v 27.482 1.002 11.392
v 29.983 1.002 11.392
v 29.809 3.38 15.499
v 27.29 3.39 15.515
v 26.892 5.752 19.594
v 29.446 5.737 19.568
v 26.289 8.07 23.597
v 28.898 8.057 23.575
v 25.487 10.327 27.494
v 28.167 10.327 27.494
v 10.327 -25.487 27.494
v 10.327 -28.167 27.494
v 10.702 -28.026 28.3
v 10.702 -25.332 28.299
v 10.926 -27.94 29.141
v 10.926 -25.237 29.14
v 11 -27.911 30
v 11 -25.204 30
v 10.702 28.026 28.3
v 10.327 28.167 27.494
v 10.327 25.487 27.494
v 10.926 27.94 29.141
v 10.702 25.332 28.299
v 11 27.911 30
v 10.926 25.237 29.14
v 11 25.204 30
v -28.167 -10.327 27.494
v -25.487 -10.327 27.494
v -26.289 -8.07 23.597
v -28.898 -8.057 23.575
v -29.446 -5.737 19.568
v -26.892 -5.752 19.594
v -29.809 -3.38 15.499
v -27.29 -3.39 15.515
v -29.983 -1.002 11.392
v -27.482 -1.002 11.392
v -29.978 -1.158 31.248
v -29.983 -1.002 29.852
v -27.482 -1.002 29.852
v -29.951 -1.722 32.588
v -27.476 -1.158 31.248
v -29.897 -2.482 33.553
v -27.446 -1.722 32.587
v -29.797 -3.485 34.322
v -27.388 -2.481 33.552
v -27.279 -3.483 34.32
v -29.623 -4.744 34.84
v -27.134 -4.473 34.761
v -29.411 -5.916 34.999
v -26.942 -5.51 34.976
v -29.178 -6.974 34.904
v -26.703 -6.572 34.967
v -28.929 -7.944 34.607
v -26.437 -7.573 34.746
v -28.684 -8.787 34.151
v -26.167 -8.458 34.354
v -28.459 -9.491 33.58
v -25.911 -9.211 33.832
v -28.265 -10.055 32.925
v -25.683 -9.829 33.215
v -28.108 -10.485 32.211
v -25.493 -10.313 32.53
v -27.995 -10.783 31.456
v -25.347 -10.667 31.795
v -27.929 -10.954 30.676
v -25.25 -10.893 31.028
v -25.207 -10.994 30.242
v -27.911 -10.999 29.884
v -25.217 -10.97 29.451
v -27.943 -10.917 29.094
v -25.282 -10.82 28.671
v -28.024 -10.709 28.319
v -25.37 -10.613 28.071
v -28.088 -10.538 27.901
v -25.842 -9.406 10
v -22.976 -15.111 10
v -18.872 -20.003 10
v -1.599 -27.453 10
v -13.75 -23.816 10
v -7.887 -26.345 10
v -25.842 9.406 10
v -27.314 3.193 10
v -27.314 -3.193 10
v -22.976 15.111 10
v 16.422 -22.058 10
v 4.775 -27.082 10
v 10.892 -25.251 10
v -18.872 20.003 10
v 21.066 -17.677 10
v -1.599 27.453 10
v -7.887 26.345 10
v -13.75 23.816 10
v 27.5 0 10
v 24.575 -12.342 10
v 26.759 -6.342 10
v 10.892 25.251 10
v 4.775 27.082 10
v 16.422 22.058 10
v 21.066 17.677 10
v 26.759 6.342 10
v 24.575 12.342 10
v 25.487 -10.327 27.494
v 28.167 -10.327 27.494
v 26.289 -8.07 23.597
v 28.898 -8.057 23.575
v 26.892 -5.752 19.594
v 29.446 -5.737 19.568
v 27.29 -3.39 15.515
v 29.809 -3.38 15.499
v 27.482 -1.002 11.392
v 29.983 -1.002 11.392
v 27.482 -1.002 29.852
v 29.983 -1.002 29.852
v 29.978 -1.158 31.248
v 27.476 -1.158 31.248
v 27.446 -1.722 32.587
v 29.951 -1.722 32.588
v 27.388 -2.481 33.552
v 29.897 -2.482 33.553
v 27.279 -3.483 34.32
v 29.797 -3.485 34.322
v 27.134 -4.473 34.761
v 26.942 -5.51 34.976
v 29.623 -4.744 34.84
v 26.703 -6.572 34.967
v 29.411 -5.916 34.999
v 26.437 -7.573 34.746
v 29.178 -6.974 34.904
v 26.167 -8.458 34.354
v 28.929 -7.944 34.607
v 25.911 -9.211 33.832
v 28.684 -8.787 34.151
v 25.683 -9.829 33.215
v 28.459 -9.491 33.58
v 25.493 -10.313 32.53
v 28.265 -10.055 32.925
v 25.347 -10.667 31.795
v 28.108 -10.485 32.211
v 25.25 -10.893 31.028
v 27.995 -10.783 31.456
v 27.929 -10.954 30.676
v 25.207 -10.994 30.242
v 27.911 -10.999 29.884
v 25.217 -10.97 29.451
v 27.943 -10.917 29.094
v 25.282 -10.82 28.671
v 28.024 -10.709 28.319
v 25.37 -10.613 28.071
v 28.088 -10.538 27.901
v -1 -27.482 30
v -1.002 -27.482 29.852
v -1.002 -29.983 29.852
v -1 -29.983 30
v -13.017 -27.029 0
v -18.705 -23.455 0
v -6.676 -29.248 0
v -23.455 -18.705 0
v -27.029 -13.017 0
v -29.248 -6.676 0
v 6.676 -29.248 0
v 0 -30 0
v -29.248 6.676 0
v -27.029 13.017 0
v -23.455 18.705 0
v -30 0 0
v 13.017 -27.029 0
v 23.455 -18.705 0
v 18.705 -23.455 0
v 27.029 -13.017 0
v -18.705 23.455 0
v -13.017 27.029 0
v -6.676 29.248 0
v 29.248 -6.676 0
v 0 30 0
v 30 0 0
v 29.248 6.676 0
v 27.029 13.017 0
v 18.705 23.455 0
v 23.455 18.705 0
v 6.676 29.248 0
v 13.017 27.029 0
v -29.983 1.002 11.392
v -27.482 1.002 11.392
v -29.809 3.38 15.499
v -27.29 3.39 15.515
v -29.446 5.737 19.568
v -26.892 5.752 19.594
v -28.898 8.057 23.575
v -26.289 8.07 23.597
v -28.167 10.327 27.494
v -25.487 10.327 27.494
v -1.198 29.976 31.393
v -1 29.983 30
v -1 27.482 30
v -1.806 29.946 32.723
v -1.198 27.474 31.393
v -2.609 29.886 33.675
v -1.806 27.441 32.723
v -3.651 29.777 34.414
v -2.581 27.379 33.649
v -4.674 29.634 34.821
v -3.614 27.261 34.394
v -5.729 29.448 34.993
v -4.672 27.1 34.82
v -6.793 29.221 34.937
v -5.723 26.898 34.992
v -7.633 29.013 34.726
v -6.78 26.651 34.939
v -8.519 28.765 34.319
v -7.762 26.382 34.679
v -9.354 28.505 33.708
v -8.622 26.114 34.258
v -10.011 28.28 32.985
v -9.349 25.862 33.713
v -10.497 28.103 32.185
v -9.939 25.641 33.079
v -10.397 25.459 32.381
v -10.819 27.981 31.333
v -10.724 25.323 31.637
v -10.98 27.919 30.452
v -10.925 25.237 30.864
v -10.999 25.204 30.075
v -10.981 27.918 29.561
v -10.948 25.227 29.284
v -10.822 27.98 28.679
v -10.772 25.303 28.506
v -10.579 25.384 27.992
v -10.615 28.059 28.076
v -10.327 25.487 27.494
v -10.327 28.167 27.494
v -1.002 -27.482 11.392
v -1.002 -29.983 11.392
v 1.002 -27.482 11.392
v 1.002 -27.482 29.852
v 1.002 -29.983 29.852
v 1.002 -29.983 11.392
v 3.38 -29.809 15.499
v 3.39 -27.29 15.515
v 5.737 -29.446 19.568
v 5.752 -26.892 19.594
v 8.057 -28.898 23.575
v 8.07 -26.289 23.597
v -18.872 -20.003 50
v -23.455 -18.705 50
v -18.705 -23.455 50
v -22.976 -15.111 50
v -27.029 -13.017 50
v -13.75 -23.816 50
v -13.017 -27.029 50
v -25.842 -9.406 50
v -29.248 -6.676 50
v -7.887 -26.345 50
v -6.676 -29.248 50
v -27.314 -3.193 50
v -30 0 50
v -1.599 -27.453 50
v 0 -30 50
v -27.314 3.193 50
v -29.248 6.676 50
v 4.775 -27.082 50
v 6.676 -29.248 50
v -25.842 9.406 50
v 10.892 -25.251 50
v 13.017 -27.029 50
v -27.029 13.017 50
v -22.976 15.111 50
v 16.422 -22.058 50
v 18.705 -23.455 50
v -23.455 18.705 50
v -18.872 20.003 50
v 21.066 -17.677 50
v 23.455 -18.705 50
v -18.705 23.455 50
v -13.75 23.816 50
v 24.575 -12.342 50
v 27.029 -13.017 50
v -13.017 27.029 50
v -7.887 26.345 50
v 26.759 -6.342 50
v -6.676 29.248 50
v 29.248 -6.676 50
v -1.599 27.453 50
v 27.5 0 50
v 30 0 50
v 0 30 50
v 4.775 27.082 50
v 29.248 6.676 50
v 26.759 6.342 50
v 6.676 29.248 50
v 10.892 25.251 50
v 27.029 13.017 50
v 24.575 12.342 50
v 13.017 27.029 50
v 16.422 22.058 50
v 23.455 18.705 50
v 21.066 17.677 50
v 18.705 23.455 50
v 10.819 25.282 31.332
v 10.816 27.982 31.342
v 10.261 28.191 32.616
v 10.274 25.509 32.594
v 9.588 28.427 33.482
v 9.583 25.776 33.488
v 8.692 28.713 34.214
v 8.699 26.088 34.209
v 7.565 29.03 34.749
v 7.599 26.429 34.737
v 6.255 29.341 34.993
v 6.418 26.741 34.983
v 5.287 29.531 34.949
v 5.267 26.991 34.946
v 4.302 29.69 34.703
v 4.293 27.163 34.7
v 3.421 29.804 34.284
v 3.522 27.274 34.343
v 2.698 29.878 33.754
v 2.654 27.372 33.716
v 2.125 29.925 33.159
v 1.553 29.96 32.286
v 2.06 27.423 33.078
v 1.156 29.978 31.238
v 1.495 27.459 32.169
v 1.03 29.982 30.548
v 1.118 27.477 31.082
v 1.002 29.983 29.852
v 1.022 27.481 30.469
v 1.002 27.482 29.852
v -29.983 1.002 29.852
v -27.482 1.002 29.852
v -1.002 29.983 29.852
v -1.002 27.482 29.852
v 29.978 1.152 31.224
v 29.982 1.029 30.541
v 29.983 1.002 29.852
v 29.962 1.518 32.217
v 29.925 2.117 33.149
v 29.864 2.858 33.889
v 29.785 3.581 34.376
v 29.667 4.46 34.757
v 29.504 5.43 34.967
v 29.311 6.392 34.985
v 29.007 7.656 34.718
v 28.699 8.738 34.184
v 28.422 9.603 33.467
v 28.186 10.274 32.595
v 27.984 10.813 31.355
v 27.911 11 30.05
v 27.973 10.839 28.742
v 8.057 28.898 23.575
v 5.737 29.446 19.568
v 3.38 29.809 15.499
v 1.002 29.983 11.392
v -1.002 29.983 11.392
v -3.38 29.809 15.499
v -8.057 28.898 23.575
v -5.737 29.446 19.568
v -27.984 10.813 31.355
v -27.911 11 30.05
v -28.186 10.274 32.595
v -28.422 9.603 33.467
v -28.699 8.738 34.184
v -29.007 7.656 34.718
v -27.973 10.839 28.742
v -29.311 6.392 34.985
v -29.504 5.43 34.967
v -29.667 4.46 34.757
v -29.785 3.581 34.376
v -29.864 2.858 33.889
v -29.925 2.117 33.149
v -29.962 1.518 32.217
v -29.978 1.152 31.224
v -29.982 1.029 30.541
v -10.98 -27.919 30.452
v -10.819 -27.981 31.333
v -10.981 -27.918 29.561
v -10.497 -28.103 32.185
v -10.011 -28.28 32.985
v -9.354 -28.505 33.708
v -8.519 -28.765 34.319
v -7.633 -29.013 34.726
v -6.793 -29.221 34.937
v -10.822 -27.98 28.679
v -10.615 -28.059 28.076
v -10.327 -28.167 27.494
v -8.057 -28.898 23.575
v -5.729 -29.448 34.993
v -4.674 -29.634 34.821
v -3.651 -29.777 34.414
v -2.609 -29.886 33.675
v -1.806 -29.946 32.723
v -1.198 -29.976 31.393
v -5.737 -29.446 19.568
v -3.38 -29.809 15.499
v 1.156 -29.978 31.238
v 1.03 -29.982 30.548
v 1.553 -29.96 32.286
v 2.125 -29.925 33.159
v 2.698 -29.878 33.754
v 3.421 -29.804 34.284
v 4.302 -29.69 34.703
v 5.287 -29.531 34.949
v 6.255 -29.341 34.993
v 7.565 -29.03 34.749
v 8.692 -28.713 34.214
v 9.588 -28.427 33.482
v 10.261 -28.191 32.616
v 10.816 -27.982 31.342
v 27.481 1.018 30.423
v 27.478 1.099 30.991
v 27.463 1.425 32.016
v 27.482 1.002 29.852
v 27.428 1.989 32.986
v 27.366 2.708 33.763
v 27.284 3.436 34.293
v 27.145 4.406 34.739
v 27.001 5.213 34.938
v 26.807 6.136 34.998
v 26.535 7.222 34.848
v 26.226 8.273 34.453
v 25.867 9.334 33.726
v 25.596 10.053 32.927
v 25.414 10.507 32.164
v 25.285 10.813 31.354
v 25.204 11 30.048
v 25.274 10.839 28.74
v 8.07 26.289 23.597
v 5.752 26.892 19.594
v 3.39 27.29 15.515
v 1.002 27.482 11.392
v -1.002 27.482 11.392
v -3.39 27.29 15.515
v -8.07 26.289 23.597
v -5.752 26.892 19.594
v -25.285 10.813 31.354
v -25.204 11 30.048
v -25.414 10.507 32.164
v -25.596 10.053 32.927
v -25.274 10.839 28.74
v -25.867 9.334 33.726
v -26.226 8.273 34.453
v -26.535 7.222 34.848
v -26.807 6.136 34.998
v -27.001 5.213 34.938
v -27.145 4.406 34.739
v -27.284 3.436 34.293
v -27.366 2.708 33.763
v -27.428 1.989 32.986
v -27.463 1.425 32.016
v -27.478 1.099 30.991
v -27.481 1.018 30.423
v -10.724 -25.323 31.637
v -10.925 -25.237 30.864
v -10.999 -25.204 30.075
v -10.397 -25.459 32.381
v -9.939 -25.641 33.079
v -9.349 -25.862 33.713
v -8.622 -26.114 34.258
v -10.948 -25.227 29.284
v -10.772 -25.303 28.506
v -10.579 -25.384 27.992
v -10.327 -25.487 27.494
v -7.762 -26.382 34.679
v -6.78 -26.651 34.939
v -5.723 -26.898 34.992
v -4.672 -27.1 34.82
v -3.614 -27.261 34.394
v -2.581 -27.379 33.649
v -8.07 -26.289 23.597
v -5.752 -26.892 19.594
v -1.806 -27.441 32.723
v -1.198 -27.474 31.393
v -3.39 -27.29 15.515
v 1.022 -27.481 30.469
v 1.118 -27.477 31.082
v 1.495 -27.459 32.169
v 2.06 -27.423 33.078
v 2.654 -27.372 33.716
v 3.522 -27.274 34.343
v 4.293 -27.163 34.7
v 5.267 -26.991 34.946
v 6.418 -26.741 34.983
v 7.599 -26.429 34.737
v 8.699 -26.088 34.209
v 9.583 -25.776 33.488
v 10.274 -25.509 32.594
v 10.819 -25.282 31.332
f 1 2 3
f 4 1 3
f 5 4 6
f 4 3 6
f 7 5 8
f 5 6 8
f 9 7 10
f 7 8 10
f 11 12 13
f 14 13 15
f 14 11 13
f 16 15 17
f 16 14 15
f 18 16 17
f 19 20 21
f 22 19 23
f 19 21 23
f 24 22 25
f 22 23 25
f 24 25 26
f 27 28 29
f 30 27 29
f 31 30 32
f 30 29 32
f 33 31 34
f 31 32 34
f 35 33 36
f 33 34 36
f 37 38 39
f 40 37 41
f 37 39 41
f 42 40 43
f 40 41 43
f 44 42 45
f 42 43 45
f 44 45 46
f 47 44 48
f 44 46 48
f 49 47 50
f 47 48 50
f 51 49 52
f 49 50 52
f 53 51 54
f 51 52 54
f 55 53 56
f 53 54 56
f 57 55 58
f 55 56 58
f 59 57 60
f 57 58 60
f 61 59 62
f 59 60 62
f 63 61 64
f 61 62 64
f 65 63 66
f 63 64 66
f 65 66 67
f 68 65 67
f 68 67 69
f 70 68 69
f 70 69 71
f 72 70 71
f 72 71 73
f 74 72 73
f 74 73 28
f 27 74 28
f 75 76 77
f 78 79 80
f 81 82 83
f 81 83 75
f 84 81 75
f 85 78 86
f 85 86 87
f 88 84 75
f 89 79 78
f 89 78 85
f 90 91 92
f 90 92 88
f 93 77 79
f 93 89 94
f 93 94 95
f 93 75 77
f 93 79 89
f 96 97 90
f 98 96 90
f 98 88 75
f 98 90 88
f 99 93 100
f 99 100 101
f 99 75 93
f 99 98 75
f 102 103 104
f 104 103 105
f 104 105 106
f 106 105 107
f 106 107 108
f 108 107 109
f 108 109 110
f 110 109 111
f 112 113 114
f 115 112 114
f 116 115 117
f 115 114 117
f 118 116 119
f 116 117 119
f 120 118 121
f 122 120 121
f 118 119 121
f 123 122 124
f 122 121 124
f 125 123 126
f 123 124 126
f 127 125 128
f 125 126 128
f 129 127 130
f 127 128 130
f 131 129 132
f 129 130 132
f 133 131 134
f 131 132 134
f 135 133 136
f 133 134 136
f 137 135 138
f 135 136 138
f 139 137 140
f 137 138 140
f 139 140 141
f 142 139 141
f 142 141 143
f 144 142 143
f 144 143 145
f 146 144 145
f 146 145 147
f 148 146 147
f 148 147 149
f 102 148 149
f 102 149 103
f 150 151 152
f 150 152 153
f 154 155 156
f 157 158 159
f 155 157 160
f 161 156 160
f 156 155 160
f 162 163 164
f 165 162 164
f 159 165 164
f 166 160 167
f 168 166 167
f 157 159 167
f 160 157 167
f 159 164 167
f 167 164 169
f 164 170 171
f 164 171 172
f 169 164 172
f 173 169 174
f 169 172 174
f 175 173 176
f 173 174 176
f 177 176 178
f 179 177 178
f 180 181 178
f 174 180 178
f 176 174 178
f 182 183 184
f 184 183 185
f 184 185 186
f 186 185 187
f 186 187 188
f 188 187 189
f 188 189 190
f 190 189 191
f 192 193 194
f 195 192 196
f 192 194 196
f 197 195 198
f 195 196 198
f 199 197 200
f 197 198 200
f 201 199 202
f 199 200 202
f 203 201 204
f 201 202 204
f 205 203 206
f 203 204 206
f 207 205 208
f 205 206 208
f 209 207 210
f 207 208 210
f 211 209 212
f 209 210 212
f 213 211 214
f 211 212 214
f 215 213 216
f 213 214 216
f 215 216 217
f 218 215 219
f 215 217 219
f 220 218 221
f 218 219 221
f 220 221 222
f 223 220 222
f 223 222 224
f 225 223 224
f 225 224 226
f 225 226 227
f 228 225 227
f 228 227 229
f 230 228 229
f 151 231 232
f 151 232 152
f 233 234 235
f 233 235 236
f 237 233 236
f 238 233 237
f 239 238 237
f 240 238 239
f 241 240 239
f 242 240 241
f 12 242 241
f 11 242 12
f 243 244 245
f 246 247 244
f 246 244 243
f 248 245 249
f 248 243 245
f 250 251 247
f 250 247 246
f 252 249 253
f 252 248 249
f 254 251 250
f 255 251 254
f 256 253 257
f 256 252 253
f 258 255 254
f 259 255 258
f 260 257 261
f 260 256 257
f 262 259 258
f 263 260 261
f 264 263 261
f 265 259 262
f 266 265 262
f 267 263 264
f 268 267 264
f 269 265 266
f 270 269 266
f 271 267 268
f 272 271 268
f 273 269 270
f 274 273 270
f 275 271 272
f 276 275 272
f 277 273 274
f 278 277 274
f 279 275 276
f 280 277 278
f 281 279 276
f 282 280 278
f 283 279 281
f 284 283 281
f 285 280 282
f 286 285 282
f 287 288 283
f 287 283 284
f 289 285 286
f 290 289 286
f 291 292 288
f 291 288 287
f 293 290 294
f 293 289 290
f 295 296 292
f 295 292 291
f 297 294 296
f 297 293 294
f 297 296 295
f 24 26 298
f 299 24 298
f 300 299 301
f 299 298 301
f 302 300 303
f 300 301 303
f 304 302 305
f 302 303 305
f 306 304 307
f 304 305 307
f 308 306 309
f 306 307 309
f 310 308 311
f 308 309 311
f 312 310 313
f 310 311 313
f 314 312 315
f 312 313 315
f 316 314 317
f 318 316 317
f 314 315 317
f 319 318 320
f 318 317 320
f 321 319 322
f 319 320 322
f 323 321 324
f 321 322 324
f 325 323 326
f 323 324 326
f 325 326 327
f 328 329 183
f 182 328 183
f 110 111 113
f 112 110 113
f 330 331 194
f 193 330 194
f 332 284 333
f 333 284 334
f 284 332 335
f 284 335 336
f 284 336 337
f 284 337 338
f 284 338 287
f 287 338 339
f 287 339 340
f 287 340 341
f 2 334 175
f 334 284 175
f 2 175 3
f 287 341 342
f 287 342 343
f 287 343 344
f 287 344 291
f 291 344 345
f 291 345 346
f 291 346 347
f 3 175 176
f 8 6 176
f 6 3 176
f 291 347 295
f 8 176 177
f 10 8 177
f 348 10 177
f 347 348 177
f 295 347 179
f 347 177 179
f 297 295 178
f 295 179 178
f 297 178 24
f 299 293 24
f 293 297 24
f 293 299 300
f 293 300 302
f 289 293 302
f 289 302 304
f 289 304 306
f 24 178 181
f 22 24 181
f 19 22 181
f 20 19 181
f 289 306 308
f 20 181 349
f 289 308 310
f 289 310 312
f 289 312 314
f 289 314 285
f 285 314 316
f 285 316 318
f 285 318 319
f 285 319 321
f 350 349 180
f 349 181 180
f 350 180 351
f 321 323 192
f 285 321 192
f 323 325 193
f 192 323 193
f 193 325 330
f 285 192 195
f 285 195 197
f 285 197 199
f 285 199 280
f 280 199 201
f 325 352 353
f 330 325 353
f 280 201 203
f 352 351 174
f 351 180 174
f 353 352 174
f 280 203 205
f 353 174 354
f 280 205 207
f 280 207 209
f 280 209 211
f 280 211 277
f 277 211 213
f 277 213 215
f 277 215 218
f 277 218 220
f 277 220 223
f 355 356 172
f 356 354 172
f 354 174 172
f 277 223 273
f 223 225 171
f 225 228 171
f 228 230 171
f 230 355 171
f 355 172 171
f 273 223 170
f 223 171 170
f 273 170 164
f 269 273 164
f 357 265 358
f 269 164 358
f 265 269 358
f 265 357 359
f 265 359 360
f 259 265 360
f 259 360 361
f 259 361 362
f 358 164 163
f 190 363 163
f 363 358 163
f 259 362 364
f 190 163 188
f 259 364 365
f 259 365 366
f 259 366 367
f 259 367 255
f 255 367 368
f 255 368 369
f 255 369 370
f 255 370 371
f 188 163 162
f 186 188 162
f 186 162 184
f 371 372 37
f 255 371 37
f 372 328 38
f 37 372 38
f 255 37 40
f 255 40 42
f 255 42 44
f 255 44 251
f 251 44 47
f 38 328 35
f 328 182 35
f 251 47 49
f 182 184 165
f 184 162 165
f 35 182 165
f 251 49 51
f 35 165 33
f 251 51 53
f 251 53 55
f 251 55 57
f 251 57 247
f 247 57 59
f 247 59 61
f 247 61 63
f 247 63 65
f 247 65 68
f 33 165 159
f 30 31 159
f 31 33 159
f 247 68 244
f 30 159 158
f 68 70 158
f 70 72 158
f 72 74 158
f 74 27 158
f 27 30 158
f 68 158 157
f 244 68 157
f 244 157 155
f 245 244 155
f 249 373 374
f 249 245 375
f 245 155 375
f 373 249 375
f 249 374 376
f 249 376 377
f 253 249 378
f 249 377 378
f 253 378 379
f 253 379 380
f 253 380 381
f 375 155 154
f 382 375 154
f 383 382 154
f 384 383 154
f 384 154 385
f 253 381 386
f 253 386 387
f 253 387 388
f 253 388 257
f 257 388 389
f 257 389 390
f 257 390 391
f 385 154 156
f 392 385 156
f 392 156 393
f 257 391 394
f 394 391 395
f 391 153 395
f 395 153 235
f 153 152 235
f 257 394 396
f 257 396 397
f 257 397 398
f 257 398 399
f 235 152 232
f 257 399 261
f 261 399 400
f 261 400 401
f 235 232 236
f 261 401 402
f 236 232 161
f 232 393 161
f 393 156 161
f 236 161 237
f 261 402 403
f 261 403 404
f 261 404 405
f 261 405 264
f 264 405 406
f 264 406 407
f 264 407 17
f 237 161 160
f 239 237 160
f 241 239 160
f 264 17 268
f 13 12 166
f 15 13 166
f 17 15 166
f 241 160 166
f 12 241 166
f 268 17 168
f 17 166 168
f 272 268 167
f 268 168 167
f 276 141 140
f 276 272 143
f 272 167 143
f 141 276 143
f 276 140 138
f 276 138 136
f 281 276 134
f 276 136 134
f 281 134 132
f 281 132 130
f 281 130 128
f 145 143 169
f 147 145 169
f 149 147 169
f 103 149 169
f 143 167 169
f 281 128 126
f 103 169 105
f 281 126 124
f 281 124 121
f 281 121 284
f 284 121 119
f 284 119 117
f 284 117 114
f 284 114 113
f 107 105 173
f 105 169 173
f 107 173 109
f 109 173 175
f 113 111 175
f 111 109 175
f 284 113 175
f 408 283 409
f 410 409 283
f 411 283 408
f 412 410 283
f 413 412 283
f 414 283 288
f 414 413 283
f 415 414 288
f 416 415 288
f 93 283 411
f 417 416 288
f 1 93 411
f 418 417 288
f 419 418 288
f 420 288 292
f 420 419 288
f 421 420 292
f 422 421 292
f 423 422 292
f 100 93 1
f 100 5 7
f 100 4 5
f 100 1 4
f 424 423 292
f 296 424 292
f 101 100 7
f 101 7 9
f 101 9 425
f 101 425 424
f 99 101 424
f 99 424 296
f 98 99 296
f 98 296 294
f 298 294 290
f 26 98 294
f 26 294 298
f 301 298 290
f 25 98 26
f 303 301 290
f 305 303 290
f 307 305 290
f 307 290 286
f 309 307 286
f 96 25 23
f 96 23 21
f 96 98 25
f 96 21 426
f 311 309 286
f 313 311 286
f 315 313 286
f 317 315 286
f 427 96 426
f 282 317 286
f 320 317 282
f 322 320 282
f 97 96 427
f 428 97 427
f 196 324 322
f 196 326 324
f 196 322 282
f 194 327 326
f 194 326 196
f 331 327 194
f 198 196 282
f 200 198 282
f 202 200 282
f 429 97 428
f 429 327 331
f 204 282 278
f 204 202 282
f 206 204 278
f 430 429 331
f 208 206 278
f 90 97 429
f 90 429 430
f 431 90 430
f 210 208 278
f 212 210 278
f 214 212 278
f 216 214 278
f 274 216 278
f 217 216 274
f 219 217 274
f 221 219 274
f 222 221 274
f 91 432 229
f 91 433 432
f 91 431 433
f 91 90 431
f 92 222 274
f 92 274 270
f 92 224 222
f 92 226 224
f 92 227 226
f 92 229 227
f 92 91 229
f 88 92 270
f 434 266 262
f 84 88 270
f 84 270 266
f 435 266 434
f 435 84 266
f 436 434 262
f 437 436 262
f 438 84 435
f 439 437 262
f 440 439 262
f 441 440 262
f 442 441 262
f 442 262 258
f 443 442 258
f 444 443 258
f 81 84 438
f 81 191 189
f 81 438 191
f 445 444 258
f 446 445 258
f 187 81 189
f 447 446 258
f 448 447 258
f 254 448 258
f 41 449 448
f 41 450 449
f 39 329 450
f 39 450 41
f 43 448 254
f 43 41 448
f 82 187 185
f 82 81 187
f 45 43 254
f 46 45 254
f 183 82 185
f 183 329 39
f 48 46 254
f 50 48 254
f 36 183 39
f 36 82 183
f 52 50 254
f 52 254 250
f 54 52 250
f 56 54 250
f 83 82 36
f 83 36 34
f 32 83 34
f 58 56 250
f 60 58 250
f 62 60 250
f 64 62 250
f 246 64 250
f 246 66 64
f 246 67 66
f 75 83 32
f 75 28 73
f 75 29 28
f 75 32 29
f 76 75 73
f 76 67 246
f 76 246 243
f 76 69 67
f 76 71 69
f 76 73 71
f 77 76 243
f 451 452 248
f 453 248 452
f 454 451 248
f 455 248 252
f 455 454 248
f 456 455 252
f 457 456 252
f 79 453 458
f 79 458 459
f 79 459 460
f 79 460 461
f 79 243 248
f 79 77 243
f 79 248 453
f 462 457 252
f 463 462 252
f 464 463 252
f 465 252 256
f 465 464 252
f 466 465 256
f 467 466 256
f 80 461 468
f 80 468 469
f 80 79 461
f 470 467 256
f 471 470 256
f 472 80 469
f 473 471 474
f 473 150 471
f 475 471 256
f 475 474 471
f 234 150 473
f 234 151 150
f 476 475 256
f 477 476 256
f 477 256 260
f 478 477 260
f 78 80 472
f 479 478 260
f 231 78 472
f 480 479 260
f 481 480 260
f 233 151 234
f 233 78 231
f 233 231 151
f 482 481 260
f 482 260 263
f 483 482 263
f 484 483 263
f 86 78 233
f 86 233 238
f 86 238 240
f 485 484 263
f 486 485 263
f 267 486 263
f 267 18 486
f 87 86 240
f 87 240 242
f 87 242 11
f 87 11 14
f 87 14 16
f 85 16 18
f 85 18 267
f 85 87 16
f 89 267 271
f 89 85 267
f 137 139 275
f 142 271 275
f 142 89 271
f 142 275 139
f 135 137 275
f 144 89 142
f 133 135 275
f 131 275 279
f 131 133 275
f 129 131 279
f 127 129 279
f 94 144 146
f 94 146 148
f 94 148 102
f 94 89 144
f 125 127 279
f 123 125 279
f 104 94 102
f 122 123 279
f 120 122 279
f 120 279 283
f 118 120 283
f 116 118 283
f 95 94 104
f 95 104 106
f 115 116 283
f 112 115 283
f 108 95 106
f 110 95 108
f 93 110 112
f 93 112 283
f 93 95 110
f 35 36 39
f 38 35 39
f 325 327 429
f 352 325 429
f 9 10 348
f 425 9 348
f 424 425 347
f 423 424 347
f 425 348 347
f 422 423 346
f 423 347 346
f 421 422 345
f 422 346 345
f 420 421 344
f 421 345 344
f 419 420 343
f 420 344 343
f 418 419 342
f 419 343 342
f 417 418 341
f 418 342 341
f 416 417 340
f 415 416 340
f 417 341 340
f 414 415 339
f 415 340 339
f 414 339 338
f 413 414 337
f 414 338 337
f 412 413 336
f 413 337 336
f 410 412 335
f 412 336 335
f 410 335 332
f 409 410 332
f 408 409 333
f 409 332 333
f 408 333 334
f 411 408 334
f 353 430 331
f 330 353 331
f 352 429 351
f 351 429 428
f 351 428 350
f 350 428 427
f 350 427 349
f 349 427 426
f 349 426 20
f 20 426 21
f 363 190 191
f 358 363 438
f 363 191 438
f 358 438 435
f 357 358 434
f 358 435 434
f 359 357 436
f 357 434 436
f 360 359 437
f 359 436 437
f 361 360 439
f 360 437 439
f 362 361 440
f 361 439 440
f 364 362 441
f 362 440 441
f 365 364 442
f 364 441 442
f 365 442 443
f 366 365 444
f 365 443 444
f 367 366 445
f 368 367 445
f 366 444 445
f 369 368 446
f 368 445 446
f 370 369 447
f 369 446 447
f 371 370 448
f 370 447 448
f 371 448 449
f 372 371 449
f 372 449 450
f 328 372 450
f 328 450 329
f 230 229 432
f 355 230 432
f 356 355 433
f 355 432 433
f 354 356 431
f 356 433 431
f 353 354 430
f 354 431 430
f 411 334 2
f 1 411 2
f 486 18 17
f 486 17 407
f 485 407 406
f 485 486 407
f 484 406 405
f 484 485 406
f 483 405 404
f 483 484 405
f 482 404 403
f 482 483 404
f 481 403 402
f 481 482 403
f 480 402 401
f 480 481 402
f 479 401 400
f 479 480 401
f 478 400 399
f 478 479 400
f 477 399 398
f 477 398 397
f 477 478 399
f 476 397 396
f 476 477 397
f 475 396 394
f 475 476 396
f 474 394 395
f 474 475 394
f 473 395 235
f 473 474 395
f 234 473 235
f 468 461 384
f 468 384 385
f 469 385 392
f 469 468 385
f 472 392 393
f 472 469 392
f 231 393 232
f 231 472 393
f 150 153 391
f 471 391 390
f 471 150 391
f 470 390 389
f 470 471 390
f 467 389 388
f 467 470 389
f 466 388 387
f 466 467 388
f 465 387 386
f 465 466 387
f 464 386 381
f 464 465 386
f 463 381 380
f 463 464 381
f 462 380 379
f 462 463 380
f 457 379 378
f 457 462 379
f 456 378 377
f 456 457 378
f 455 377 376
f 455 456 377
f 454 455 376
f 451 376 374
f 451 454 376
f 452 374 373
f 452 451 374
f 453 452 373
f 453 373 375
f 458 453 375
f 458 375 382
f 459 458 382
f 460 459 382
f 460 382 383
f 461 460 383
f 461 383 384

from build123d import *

# Parameters (mm, degrees)
F0_R      = 30
F1_DEPTH  = 10
F2_R      = 30
F2_R_2    = 27.5
F3_DEPTH  = 40
F5_DEPTH  = 35
F6_DEPTH  = 35
F7_DEPTH  = 0.001
F8_ANGLE  = 90
F10_DEPTH = 100


with BuildPart() as f1:
    # F0 (on Top) → F1 (new body)
    with BuildSketch(Plane.XY):
        Circle(F0_R)
    extrude(amount=F1_DEPTH)

    # F2 (on face) → F3 (join)
    with BuildSketch(Plane.XY.offset(10)):
        Circle(F2_R)
        Circle(F2_R_2, mode=Mode.SUBTRACT)
    extrude(amount=F3_DEPTH)

    # F4 (on Front) → F5 (cut)
    with BuildSketch(Plane.XZ):
        with BuildLine():
            ThreePointArc((-1.0021791073, 29.8523980864), (-1.0005448065, 29.9261910009), (-1, 30))
            ThreePointArc((-1, 30), (-7.2972686774, 34.8287776899), (-10.3268375915, 27.4943111812))
            Line((-10.3268375915, 27.4943111812), (-1.0021791073, 29.8523980864))
        make_face()
        with BuildLine():
            Line((-1.0021791073, 29.8523980864), (-10.3268375915, 27.4943111812))
            ThreePointArc((-10.3268375915, 27.4943111812), (-4.7741541244, 25.1525984394), (-1.0021791073, 29.8523980864))
        make_face()
        with BuildLine():
            ThreePointArc((-1.0021791073, 29.8523980864), (-4.7741541244, 25.1525984394), (-10.3268375915, 27.4943111812))
            Line((-10.3268375915, 27.4943111812), (-1.0021791073, 11.3924382934))
            Line((-1.0021791073, 11.3924382934), (-1.0021791073, 29.8523980864))
        make_face()
        with BuildLine():
            ThreePointArc((10.3268375915, 27.4943111812), (10.8287776899, 28.7027313226), (11, 30))
            ThreePointArc((11, 30), (5.9261910009, 34.9994551935), (1.0021791073, 29.8523980864))
            Line((1.0021791073, 29.8523980864), (10.3268375915, 27.4943111812))
        make_face()
        with BuildLine():
            Line((10.3268375915, 27.4943111812), (1.0021791073, 29.8523980864))
            ThreePointArc((1.0021791073, 29.8523980864), (4.7741541244, 25.1525984394), (10.3268375915, 27.4943111812))
        make_face()
        with BuildLine():
            ThreePointArc((10.3268375915, 27.4943111812), (4.7741541244, 25.1525984394), (1.0021791073, 29.8523980864))
            Line((1.0021791073, 29.8523980864), (1.0021791073, 11.3924382934))
            Line((1.0021791073, 11.3924382934), (10.3268375915, 27.4943111812))
        make_face()
    extrude(amount=-F5_DEPTH, mode=Mode.SUBTRACT)

    # F4 (on Front) → F6 (cut)
    with BuildSketch(Plane.XZ):
        with BuildLine():
            ThreePointArc((10.3268375915, 27.4943111812), (10.8287776899, 28.7027313226), (11, 30))
            ThreePointArc((11, 30), (5.9261910009, 34.9994551935), (1.0021791073, 29.8523980864))
            Line((1.0021791073, 29.8523980864), (10.3268375915, 27.4943111812))
        make_face()
        with BuildLine():
            Line((10.3268375915, 27.4943111812), (1.0021791073, 29.8523980864))
            ThreePointArc((1.0021791073, 29.8523980864), (4.7741541244, 25.1525984394), (10.3268375915, 27.4943111812))
        make_face()
        with BuildLine():
            ThreePointArc((10.3268375915, 27.4943111812), (4.7741541244, 25.1525984394), (1.0021791073, 29.8523980864))
            Line((1.0021791073, 29.8523980864), (1.0021791073, 11.3924382934))
            Line((1.0021791073, 11.3924382934), (10.3268375915, 27.4943111812))
        make_face()
        with BuildLine():
            ThreePointArc((-1.0021791073, 29.8523980864), (-1.0005448065, 29.9261910009), (-1, 30))
            ThreePointArc((-1, 30), (-7.2972686774, 34.8287776899), (-10.3268375915, 27.4943111812))
            Line((-10.3268375915, 27.4943111812), (-1.0021791073, 29.8523980864))
        make_face()
        with BuildLine():
            Line((-1.0021791073, 29.8523980864), (-10.3268375915, 27.4943111812))
            ThreePointArc((-10.3268375915, 27.4943111812), (-4.7741541244, 25.1525984394), (-1.0021791073, 29.8523980864))
        make_face()
        with BuildLine():
            ThreePointArc((-1.0021791073, 29.8523980864), (-4.7741541244, 25.1525984394), (-10.3268375915, 27.4943111812))
            Line((-10.3268375915, 27.4943111812), (-1.0021791073, 11.3924382934))
            Line((-1.0021791073, 11.3924382934), (-1.0021791073, 29.8523980864))
        make_face()
    extrude(amount=F6_DEPTH, mode=Mode.SUBTRACT)


with BuildPart() as f7:
    # F4 (on Front) → F7 (new body)
    with BuildSketch(Plane.XZ):
        with BuildLine():
            ThreePointArc((10.3268375915, 27.4943111812), (10.8287776899, 28.7027313226), (11, 30))
            ThreePointArc((11, 30), (5.9261910009, 34.9994551935), (1.0021791073, 29.8523980864))
            Line((1.0021791073, 29.8523980864), (10.3268375915, 27.4943111812))
        make_face()
        with BuildLine():
            Line((10.3268375915, 27.4943111812), (1.0021791073, 29.8523980864))
            ThreePointArc((1.0021791073, 29.8523980864), (4.7741541244, 25.1525984394), (10.3268375915, 27.4943111812))
        make_face()
        with BuildLine():
            ThreePointArc((10.3268375915, 27.4943111812), (4.7741541244, 25.1525984394), (1.0021791073, 29.8523980864))
            Line((1.0021791073, 29.8523980864), (1.0021791073, 11.3924382934))
            Line((1.0021791073, 11.3924382934), (10.3268375915, 27.4943111812))
        make_face()
    extrude(amount=F7_DEPTH)


with BuildPart() as f7b:
    # F4 (on Front) → F7, piece 2 (new body)
    with BuildSketch(Plane.XZ):
        with BuildLine():
            ThreePointArc((-1.0021791073, 29.8523980864), (-1.0005448065, 29.9261910009), (-1, 30))
            ThreePointArc((-1, 30), (-7.2972686774, 34.8287776899), (-10.3268375915, 27.4943111812))
            Line((-10.3268375915, 27.4943111812), (-1.0021791073, 29.8523980864))
        make_face()
        with BuildLine():
            Line((-1.0021791073, 29.8523980864), (-10.3268375915, 27.4943111812))
            ThreePointArc((-10.3268375915, 27.4943111812), (-4.7741541244, 25.1525984394), (-1.0021791073, 29.8523980864))
        make_face()
        with BuildLine():
            ThreePointArc((-1.0021791073, 29.8523980864), (-4.7741541244, 25.1525984394), (-10.3268375915, 27.4943111812))
            Line((-10.3268375915, 27.4943111812), (-1.0021791073, 11.3924382934))
            Line((-1.0021791073, 11.3924382934), (-1.0021791073, 29.8523980864))
        make_face()
    extrude(amount=F7_DEPTH)


with BuildPart() as f7b_1:
    # F8: moved
    add(f7b.part.rotate(Axis((0, 0, 0), (0, 0, -1)), F8_ANGLE))


with BuildPart() as f7_1:
    # F8: moved
    add(f7.part.rotate(Axis((0, 0, 0), (0, 0, -1)), F8_ANGLE))


with BuildPart() as f7_2:
    # F9: moved
    add(f7_1.part.moved(Location((48.6, 0, 0))))


with BuildPart() as f7b_2:
    # F9: moved
    add(f7b_1.part.moved(Location((48.6, 0, 0))))


with BuildPart() as f10_tool:
    # F7_face (on face) → F10 (new body)
    with BuildSketch(Plane(origin=(48.6, -4.9596337945, 26.1247931076), x_dir=(0, 1, 0), z_dir=(1, 0, 0))):
        with BuildLine():
            Line((3.9574546871, -14.7323548142), (3.9574546871, 3.7276049788))
            ThreePointArc((3.9574546871, 3.7276049788), (-2.2662120811, 8.722608453), (-5.367203797, 1.3695180736))
            Line((-5.367203797, 1.3695180736), (3.9574546871, -14.7323548142))
        make_face()
        with BuildLine():
            Line((5.9618129018, -14.7323548142), (15.2864713859, 1.3695180736))
            ThreePointArc((15.2864713859, 1.3695180736), (12.18547967, 8.722608453), (5.9618129018, 3.7276049788))
            Line((5.9618129018, 3.7276049788), (5.9618129018, -14.7323548142))
        make_face()
    extrude(amount=-F10_DEPTH)


with BuildPart() as f1_1:
    add(f1.part)

    # F10: cut by f10_tool
    add(f10_tool.part, mode=Mode.SUBTRACT)


with BuildPart() as f7_3:
    add(f7_2.part)

    # F10: cut by f10_tool
    add(f10_tool.part, mode=Mode.SUBTRACT)


with BuildPart() as f7b_3:
    add(f7b_2.part)

    # F10: cut by f10_tool
    add(f10_tool.part, mode=Mode.SUBTRACT)


solid = f1_1.part
